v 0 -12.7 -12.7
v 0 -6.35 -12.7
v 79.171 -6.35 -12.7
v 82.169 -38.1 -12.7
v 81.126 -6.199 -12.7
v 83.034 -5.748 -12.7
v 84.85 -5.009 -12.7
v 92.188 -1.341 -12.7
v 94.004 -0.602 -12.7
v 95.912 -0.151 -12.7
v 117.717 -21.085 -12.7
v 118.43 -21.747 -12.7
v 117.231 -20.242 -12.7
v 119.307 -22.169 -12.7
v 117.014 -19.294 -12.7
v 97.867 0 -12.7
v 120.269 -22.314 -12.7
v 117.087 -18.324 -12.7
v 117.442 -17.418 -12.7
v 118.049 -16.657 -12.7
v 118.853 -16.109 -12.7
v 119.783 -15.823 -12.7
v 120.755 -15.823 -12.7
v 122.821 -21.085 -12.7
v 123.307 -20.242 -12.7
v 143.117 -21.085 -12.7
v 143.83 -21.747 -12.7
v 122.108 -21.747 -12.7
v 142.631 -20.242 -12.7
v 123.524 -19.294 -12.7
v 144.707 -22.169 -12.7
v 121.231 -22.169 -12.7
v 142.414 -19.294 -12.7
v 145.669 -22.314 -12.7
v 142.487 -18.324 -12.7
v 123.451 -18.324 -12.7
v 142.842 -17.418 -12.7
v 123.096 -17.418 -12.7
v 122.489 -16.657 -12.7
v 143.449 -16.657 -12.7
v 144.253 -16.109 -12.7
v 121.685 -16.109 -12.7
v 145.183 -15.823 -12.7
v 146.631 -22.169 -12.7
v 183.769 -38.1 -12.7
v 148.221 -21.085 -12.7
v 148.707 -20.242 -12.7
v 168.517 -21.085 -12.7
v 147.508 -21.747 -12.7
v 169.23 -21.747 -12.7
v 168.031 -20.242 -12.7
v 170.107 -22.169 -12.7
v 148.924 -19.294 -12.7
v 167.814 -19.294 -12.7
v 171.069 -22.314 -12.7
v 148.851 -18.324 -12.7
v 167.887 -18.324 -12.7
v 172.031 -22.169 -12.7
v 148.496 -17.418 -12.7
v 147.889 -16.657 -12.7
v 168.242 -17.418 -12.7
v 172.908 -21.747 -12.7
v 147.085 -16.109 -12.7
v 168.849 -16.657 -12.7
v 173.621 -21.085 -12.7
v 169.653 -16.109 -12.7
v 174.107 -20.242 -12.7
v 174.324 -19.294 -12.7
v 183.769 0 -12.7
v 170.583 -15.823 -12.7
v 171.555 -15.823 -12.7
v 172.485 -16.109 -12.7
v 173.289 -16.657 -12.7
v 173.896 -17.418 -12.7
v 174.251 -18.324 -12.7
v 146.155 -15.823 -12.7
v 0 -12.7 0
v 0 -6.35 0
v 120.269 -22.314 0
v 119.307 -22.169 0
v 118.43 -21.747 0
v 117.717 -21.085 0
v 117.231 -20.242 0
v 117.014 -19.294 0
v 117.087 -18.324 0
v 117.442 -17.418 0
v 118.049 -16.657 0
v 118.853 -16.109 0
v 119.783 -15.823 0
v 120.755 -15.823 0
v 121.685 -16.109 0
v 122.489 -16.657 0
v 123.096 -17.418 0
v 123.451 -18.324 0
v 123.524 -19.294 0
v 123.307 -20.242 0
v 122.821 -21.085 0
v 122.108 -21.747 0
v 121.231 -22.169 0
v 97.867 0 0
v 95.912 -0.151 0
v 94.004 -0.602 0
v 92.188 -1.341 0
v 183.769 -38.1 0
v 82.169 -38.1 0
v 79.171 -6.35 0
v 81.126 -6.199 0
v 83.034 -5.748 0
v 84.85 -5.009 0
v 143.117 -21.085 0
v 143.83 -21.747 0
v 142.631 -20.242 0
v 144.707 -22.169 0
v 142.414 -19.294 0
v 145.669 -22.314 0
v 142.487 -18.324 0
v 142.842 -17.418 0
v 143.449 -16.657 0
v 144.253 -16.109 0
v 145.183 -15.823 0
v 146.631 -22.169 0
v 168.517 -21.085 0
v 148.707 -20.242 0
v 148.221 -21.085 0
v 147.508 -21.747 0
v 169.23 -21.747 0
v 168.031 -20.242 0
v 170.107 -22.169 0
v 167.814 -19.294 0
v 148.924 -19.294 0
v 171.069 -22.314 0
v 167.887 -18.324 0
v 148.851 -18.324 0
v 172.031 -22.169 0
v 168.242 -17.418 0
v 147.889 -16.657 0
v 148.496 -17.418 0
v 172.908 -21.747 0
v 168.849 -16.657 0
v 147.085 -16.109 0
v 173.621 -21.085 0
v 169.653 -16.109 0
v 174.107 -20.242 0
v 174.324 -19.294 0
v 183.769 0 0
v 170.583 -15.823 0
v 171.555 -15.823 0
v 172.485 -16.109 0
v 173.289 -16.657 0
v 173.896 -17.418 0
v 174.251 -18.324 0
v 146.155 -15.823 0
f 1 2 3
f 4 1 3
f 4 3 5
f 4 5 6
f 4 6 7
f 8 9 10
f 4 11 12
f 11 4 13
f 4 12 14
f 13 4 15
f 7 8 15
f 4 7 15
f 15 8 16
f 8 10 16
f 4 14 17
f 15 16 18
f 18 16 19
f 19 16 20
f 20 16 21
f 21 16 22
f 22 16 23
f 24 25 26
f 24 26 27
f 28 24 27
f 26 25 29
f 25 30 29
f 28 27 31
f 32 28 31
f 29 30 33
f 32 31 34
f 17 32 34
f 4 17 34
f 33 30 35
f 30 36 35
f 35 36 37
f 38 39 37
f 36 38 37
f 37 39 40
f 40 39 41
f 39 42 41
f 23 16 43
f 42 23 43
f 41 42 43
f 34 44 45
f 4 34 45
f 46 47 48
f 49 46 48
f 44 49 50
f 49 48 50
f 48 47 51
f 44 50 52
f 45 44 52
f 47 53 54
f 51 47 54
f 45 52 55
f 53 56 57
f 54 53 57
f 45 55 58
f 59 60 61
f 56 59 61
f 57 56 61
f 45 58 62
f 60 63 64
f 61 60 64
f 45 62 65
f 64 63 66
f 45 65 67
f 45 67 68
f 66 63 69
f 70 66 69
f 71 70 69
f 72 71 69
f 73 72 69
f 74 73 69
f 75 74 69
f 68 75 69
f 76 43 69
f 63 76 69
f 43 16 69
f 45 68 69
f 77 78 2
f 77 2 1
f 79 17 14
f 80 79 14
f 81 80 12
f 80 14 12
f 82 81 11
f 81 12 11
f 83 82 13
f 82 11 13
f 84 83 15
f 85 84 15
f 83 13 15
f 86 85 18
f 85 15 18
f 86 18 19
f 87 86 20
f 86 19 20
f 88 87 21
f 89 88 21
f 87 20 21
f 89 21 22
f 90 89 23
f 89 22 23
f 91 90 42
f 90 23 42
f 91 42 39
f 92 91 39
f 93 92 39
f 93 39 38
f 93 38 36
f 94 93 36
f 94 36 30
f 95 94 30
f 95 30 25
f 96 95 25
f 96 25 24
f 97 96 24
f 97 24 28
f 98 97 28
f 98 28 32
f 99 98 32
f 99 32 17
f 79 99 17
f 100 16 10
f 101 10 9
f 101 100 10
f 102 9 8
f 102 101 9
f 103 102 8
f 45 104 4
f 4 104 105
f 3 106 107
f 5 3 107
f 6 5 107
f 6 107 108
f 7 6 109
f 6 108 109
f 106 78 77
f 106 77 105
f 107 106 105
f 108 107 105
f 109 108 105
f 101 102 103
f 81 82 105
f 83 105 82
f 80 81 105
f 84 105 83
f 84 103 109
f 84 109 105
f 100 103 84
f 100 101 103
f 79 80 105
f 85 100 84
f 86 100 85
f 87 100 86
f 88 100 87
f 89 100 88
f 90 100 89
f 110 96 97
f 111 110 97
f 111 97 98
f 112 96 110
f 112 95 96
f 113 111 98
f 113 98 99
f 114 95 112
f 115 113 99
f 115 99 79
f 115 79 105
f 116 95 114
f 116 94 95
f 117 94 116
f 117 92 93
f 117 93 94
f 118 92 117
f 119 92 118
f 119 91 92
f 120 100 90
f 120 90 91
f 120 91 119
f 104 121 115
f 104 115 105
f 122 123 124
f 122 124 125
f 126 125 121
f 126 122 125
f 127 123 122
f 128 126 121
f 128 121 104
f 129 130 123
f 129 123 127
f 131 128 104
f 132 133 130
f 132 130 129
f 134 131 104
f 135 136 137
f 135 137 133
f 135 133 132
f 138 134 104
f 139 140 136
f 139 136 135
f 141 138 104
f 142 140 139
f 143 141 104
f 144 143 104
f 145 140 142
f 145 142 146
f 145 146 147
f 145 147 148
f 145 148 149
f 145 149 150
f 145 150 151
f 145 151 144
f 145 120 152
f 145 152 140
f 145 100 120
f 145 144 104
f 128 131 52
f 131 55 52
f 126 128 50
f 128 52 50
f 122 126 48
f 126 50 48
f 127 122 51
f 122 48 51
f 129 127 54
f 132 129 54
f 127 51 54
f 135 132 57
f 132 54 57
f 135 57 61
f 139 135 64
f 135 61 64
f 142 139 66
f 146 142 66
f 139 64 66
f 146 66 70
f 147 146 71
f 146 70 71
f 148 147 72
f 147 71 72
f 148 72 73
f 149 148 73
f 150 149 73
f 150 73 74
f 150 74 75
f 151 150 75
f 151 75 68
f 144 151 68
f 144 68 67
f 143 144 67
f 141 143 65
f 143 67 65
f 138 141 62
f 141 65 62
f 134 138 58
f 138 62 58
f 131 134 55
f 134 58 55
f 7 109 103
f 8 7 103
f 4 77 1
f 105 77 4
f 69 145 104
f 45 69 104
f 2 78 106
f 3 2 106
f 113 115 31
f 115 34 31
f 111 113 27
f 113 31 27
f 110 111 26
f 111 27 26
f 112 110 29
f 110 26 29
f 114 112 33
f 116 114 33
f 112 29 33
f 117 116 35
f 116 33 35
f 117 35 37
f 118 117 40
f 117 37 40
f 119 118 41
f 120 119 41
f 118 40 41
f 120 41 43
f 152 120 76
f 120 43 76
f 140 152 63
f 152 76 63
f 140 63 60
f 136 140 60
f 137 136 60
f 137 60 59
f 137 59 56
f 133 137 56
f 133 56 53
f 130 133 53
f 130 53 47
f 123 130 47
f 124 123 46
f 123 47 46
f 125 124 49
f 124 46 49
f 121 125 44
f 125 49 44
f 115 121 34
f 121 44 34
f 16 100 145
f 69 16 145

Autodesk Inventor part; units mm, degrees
ref_plane "YZ Plane" through (0, 0, 0) normal (1, 0, 0) x (0, 1, 0)
ref_plane "XZ Plane" through (0, 0, 0) normal (0, 1, 0) x (-1, 0, 0)
ref_plane "XY Plane" through (0, 0, 0) normal (0, 0, 1) x (1, 0, 0)
sketch "Sketch1" plane through (0, 0, 0) normal (0, 0, 1) x (1, 0, 0)
  line L0 (0, 0) -> (0, -12.7) construction
  line L1 (0, -12.7) -> (0, -31.75) construction
  line L2 (0, 6.35) -> (0, 0) construction
  line L3 (-50.8, -19.05) -> (152.4, -19.05) construction
  line L4 (82.169, 0) -> (183.769, 0) construction
  line L5 (183.769, 0) -> (183.769, -38.1) construction
  line L6 (183.769, -38.1) -> (82.169, -38.1) construction
  line L7 (82.169, -38.1) -> (82.169, 0) construction
  line L8 (183.769, 0) -> (183.769, -38.1)
  line L9 (183.769, -38.1) -> (82.169, -38.1)
  line L10 (79.1709, -6.35) -> (0, -6.35) construction
  line L11 (0, -6.35) -> (0, -12.7)
  line L12 (0, -12.7) -> (82.169, -38.1)
  line L13 (0, -6.35) -> (79.1709, -6.35)
  line L14 (97.8671, 0) -> (183.769, 0)
  line L15 (84.8505, -5.0092) -> (92.1875, -1.3408)
  arc A0 (79.1709, -6.35) -> (84.8505, -5.0092) centre (79.1709, 6.35) ccw
  arc A1 (97.8671, 0) -> (92.1875, -1.3408) centre (97.8671, -12.7) ccw
  point P0 (120.269, -19.05)
  point P1 (145.669, -19.05)
  point P2 (171.069, -19.05)
  dimension "d25" = 12.7
  dimension "d26" = 19.05
  dimension "d27" = 82.169
  dimension "d30" = 203.2
  dimension "d32" = 152.4
  dimension "d34" = 101.6
  dimension "d35" = 38.1
  dimension "d36" = 38.1
  dimension "d37" = 25.4
  dimension "d38" = 25.4
  dimension "d39" = 12.7
  dimension "d98" = 6.35
  dimension "d100" = 12.7
  dimension "d101" = 63.435
  dimension "d102" = 72.823
  dimension "d103" = 38.1
  dimension "d104" = 6.35
  dimension "d105" = 79.1709
extrude "Extrusion1" add sketch "Sketch1" against normal blind 12.7
hole "Hole7" at (120.269, -19.05, 0) at (145.669, -19.05, 0) at (171.069, -19.05, 0) direction (0, 0, -1) diameter 6.5278 end through all clearance for "Socket Head Cap Screw" size "1/4" standard "Ansi Unified Screw Threads"
properties part number "Y_shaft_support_brace" material "Aluminum 6061"
